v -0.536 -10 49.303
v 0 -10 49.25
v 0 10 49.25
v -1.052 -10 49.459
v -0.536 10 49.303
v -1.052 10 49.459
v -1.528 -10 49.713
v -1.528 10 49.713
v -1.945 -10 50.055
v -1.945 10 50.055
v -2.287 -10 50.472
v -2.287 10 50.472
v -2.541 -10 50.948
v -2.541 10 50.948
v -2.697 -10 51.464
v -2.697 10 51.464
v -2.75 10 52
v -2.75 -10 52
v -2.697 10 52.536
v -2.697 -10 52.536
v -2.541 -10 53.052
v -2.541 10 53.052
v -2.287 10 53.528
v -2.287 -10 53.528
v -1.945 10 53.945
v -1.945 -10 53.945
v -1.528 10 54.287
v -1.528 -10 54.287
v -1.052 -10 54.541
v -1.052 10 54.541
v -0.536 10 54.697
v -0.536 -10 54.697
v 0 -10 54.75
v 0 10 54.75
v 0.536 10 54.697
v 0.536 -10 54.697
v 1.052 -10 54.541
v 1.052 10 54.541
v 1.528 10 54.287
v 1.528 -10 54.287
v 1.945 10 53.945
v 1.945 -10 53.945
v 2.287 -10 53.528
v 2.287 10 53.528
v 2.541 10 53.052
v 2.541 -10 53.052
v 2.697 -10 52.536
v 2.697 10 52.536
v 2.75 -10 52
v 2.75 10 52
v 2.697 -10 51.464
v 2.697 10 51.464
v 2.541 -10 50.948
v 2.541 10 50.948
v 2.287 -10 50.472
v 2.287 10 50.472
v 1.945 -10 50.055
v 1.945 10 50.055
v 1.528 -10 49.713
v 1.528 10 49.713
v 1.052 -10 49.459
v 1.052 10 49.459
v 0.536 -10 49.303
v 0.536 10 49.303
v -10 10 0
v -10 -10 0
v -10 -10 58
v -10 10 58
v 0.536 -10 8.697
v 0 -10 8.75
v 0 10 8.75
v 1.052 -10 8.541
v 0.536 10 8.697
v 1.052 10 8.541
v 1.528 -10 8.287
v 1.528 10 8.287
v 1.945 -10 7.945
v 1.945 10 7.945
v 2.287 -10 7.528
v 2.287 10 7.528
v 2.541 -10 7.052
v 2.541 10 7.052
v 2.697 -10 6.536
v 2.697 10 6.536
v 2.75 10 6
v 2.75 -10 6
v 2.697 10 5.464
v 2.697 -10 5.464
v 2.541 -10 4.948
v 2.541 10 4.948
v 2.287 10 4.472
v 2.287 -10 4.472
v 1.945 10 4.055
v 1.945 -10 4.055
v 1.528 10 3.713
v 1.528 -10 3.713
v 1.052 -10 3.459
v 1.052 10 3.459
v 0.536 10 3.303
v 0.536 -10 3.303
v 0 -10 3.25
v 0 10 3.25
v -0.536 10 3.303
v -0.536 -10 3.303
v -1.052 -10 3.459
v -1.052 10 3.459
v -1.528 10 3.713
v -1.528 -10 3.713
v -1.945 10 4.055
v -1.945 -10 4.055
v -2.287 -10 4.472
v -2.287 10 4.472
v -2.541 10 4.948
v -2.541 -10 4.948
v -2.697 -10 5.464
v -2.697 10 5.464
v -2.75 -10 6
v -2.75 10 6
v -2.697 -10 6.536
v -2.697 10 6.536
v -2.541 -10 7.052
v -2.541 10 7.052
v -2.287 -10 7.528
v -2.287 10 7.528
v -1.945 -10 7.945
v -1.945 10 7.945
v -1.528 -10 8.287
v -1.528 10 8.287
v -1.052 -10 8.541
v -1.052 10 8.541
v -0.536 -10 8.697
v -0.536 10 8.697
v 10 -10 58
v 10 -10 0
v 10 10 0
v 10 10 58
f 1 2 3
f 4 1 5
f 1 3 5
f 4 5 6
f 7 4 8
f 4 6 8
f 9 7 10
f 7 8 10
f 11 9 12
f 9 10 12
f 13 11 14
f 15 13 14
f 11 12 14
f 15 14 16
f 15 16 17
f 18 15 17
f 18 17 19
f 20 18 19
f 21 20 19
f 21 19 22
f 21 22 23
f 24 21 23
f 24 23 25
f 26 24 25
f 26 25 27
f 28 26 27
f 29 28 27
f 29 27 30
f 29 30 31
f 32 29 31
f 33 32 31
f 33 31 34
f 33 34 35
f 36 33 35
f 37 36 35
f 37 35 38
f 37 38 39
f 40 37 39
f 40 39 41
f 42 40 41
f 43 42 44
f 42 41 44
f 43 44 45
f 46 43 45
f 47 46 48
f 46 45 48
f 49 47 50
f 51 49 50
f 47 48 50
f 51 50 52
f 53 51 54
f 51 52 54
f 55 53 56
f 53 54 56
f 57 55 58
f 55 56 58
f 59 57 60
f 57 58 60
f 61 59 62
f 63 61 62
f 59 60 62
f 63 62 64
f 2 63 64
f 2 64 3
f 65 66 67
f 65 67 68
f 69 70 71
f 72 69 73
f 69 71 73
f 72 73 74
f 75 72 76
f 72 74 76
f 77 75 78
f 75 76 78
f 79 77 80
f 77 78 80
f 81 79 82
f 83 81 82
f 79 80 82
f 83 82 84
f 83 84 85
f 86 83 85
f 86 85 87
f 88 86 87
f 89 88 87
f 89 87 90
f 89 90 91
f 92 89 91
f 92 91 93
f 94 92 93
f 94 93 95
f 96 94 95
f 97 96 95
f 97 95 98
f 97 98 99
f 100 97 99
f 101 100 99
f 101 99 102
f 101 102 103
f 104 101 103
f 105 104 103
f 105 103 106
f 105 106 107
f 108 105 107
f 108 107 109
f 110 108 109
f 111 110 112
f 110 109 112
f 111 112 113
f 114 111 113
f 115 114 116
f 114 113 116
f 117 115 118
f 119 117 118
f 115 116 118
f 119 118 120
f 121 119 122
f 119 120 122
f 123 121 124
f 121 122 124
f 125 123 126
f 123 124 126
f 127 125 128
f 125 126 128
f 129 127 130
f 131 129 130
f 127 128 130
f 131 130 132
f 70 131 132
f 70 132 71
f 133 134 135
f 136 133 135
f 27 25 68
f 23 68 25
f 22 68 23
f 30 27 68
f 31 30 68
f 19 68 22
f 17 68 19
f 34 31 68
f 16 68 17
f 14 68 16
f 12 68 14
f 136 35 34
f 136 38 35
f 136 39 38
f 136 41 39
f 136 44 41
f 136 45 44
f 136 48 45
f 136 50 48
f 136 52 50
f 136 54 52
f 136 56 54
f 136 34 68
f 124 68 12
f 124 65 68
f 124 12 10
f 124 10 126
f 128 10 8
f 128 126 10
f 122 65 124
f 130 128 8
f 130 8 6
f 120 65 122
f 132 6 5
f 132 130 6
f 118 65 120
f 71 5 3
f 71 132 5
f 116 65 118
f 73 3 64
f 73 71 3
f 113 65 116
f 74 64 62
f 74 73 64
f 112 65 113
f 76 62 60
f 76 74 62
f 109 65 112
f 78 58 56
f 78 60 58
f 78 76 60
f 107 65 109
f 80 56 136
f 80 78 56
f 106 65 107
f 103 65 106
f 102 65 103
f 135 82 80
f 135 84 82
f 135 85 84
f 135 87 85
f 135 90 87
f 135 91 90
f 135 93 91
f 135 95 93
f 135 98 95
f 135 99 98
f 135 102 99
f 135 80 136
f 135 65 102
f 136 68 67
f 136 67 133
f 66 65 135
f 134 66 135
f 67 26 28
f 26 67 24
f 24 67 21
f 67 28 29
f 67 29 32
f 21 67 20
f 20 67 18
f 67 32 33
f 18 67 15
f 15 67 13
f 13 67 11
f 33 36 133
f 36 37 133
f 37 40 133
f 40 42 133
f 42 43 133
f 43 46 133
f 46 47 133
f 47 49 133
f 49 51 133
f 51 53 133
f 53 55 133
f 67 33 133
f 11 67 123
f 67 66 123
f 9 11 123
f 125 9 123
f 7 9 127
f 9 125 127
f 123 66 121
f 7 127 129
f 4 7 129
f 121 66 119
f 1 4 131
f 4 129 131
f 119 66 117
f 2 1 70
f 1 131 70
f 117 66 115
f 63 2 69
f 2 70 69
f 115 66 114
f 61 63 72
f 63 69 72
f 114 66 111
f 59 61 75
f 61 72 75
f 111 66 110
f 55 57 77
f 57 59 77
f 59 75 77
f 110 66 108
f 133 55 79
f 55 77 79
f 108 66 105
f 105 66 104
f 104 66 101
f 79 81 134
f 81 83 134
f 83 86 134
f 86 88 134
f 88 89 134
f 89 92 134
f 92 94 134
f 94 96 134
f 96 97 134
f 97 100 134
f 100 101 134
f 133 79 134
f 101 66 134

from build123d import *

# Parameters (mm, degrees)
SKETCH_1_W          = 20
SKETCH_1_H          = 20
EXTRUDE_1_DEPTH     = 58
SKETCH_2_R          = 2.75
CUT_EXTRUDE_1_DEPTH = 63.161081072


with BuildPart() as part:
    # 草图1 → 凸台-拉伸1 (new body)
    with BuildSketch(Plane.XY):
        Rectangle(SKETCH_1_W, SKETCH_1_H)
    extrude(amount=EXTRUDE_1_DEPTH)

    # 草图2 → 切除-拉伸1 (cut, through all)
    with BuildSketch(Plane(origin=(0, 10, 0), x_dir=(1, 0, 0), z_dir=(0, 1, 0))):
        with Locations(Location((0, -6, 0), (0, 0, 270))):
            Circle(SKETCH_2_R)
        with Locations(Location((0, -52, 0), (0, 0, 90))):
            Circle(SKETCH_2_R)
    extrude(amount=-CUT_EXTRUDE_1_DEPTH, mode=Mode.SUBTRACT)


solid = part.part
